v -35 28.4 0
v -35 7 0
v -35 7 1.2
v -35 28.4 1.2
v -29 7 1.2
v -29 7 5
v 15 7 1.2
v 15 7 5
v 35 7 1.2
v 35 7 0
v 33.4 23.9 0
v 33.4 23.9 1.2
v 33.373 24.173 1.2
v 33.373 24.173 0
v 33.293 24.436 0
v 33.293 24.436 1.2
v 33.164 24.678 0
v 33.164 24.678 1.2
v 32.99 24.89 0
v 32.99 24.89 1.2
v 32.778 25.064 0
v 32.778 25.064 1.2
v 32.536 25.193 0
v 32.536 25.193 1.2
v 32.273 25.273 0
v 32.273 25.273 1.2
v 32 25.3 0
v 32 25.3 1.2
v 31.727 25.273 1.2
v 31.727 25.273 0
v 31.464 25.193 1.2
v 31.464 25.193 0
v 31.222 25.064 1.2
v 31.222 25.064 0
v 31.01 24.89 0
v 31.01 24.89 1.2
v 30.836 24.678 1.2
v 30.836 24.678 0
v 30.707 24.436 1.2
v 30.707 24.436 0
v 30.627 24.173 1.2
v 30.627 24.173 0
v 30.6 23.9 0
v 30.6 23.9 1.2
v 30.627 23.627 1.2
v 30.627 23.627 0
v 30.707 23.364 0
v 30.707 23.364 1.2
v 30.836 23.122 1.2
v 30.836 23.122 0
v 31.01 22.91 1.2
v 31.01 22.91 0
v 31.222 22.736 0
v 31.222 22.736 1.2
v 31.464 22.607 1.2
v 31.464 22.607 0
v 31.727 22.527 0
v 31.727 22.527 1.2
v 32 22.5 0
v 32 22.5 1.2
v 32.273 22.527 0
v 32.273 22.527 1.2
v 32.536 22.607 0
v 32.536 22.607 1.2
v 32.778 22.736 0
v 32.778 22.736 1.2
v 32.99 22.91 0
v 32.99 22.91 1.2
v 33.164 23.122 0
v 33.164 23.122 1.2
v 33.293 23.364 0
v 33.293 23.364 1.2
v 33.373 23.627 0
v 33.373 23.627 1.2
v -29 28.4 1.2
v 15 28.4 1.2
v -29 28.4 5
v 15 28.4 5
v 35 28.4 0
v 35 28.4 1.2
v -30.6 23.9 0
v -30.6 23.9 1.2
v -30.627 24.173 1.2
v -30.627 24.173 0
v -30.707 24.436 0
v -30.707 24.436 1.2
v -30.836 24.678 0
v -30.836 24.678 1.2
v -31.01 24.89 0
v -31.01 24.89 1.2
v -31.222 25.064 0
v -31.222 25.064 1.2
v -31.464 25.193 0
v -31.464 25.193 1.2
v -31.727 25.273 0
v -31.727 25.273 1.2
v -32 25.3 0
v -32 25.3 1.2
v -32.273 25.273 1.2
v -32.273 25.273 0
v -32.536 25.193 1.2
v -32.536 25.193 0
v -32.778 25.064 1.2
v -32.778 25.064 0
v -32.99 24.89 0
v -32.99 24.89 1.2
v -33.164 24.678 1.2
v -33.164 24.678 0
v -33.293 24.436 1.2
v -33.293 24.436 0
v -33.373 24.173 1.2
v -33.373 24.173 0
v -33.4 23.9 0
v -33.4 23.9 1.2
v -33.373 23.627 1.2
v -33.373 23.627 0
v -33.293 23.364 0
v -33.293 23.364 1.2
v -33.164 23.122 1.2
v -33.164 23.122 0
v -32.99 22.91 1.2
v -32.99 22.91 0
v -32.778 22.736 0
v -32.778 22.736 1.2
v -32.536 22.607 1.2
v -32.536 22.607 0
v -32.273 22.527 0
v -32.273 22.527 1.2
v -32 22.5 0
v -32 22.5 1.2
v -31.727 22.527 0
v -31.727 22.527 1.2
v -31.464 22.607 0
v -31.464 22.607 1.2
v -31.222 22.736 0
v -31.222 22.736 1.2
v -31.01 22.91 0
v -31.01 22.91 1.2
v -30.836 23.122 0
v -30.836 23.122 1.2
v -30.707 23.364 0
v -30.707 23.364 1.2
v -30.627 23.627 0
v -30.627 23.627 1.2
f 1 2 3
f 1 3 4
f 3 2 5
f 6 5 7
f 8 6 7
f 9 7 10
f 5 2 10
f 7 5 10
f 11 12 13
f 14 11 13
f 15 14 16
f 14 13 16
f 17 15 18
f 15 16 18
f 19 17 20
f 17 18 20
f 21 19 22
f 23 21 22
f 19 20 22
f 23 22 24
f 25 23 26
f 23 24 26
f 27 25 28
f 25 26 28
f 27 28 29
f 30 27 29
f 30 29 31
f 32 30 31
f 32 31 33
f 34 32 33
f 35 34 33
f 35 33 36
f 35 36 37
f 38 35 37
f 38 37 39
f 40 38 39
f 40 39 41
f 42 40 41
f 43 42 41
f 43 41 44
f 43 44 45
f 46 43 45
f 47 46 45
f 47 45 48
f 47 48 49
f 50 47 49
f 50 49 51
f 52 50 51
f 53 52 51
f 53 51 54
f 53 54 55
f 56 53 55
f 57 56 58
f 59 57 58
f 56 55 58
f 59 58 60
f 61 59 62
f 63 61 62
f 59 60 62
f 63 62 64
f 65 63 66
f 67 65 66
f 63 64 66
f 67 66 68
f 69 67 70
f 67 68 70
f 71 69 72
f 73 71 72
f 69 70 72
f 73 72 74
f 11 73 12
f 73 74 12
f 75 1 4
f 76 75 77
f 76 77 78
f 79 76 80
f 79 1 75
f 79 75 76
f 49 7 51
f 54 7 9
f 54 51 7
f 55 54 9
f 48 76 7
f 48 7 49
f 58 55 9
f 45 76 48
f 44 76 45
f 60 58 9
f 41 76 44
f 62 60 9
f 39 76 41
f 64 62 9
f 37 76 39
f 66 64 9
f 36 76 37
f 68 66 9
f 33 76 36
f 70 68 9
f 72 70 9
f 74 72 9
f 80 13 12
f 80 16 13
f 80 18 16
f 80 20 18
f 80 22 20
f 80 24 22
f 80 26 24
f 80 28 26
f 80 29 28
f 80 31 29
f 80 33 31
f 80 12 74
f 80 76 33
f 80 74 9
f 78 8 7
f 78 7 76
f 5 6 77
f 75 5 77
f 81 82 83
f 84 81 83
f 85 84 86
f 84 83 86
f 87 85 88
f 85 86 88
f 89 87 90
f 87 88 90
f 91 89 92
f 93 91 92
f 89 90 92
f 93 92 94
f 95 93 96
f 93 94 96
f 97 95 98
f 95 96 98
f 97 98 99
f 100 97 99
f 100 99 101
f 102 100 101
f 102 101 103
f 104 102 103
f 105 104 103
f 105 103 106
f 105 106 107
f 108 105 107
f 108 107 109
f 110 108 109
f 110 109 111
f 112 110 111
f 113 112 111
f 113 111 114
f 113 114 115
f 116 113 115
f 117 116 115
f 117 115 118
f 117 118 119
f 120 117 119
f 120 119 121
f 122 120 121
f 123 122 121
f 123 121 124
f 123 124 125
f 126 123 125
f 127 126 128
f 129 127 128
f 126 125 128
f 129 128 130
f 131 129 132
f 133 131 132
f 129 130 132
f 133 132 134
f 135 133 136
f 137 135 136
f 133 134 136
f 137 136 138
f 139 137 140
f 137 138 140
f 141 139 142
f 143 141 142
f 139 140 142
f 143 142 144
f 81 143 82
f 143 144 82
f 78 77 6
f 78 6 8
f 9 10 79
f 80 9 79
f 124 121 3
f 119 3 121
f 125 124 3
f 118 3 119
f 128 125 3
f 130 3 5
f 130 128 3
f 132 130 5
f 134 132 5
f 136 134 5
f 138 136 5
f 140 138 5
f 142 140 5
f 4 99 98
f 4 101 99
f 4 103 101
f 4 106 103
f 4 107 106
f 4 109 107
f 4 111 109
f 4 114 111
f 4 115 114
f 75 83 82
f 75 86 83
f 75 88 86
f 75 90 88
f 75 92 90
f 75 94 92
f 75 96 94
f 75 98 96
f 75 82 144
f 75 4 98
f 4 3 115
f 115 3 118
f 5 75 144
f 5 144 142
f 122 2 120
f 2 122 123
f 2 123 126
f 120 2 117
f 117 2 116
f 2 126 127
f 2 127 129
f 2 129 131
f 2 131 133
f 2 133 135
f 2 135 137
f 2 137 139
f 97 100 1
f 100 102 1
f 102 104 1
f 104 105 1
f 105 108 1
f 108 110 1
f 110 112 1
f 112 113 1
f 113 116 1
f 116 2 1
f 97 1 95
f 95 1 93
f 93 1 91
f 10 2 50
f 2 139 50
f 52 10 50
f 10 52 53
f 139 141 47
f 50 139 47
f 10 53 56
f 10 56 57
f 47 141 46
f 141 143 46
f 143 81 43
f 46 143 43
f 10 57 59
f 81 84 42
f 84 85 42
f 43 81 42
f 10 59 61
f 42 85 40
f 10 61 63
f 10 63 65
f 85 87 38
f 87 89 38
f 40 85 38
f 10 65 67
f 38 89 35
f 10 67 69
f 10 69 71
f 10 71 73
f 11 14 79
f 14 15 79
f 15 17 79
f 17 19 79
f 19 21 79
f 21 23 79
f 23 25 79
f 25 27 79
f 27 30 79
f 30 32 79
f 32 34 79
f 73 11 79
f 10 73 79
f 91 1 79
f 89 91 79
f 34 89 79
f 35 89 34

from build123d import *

# Parameters (mm, degrees)
SKETCH1_W           = 70
SKETCH1_H           = 21.4
BOSS_EXTRUDE1_DEPTH = 5
SKETCH2_W           = 6
SKETCH2_H           = 21.4
SKETCH2_W_2         = 20
CUT_EXTRUDE1_DEPTH  = 3.8
SKETCH3_R           = 1.4
CUT_EXTRUDE2_DEPTH  = 46.232731512


with BuildPart() as part:
    # Sketch1 → Boss-Extrude1 (new body)
    with BuildSketch(Plane.XY):
        with Locations((0, 17.7)):
            Rectangle(SKETCH1_W, SKETCH1_H)
    extrude(amount=BOSS_EXTRUDE1_DEPTH)

    # Sketch2 → Cut-Extrude1 (cut)
    with BuildSketch(Plane.XY.offset(5)):
        with Locations((-32, 17.7)):
            Rectangle(SKETCH2_W, SKETCH2_H)
        with Locations((25, 17.7)):
            Rectangle(SKETCH2_W_2, SKETCH2_H)
    extrude(amount=-CUT_EXTRUDE1_DEPTH, mode=Mode.SUBTRACT)

    # Sketch3 → Cut-Extrude2 (cut, through all)
    with BuildSketch(Plane.XY.offset(1.2)):
        with Locations((32, 23.9)):
            Circle(SKETCH3_R)
        with Locations((-32, 23.9)):
            Circle(SKETCH3_R)
    extrude(amount=-CUT_EXTRUDE2_DEPTH, mode=Mode.SUBTRACT)


solid = part.part
